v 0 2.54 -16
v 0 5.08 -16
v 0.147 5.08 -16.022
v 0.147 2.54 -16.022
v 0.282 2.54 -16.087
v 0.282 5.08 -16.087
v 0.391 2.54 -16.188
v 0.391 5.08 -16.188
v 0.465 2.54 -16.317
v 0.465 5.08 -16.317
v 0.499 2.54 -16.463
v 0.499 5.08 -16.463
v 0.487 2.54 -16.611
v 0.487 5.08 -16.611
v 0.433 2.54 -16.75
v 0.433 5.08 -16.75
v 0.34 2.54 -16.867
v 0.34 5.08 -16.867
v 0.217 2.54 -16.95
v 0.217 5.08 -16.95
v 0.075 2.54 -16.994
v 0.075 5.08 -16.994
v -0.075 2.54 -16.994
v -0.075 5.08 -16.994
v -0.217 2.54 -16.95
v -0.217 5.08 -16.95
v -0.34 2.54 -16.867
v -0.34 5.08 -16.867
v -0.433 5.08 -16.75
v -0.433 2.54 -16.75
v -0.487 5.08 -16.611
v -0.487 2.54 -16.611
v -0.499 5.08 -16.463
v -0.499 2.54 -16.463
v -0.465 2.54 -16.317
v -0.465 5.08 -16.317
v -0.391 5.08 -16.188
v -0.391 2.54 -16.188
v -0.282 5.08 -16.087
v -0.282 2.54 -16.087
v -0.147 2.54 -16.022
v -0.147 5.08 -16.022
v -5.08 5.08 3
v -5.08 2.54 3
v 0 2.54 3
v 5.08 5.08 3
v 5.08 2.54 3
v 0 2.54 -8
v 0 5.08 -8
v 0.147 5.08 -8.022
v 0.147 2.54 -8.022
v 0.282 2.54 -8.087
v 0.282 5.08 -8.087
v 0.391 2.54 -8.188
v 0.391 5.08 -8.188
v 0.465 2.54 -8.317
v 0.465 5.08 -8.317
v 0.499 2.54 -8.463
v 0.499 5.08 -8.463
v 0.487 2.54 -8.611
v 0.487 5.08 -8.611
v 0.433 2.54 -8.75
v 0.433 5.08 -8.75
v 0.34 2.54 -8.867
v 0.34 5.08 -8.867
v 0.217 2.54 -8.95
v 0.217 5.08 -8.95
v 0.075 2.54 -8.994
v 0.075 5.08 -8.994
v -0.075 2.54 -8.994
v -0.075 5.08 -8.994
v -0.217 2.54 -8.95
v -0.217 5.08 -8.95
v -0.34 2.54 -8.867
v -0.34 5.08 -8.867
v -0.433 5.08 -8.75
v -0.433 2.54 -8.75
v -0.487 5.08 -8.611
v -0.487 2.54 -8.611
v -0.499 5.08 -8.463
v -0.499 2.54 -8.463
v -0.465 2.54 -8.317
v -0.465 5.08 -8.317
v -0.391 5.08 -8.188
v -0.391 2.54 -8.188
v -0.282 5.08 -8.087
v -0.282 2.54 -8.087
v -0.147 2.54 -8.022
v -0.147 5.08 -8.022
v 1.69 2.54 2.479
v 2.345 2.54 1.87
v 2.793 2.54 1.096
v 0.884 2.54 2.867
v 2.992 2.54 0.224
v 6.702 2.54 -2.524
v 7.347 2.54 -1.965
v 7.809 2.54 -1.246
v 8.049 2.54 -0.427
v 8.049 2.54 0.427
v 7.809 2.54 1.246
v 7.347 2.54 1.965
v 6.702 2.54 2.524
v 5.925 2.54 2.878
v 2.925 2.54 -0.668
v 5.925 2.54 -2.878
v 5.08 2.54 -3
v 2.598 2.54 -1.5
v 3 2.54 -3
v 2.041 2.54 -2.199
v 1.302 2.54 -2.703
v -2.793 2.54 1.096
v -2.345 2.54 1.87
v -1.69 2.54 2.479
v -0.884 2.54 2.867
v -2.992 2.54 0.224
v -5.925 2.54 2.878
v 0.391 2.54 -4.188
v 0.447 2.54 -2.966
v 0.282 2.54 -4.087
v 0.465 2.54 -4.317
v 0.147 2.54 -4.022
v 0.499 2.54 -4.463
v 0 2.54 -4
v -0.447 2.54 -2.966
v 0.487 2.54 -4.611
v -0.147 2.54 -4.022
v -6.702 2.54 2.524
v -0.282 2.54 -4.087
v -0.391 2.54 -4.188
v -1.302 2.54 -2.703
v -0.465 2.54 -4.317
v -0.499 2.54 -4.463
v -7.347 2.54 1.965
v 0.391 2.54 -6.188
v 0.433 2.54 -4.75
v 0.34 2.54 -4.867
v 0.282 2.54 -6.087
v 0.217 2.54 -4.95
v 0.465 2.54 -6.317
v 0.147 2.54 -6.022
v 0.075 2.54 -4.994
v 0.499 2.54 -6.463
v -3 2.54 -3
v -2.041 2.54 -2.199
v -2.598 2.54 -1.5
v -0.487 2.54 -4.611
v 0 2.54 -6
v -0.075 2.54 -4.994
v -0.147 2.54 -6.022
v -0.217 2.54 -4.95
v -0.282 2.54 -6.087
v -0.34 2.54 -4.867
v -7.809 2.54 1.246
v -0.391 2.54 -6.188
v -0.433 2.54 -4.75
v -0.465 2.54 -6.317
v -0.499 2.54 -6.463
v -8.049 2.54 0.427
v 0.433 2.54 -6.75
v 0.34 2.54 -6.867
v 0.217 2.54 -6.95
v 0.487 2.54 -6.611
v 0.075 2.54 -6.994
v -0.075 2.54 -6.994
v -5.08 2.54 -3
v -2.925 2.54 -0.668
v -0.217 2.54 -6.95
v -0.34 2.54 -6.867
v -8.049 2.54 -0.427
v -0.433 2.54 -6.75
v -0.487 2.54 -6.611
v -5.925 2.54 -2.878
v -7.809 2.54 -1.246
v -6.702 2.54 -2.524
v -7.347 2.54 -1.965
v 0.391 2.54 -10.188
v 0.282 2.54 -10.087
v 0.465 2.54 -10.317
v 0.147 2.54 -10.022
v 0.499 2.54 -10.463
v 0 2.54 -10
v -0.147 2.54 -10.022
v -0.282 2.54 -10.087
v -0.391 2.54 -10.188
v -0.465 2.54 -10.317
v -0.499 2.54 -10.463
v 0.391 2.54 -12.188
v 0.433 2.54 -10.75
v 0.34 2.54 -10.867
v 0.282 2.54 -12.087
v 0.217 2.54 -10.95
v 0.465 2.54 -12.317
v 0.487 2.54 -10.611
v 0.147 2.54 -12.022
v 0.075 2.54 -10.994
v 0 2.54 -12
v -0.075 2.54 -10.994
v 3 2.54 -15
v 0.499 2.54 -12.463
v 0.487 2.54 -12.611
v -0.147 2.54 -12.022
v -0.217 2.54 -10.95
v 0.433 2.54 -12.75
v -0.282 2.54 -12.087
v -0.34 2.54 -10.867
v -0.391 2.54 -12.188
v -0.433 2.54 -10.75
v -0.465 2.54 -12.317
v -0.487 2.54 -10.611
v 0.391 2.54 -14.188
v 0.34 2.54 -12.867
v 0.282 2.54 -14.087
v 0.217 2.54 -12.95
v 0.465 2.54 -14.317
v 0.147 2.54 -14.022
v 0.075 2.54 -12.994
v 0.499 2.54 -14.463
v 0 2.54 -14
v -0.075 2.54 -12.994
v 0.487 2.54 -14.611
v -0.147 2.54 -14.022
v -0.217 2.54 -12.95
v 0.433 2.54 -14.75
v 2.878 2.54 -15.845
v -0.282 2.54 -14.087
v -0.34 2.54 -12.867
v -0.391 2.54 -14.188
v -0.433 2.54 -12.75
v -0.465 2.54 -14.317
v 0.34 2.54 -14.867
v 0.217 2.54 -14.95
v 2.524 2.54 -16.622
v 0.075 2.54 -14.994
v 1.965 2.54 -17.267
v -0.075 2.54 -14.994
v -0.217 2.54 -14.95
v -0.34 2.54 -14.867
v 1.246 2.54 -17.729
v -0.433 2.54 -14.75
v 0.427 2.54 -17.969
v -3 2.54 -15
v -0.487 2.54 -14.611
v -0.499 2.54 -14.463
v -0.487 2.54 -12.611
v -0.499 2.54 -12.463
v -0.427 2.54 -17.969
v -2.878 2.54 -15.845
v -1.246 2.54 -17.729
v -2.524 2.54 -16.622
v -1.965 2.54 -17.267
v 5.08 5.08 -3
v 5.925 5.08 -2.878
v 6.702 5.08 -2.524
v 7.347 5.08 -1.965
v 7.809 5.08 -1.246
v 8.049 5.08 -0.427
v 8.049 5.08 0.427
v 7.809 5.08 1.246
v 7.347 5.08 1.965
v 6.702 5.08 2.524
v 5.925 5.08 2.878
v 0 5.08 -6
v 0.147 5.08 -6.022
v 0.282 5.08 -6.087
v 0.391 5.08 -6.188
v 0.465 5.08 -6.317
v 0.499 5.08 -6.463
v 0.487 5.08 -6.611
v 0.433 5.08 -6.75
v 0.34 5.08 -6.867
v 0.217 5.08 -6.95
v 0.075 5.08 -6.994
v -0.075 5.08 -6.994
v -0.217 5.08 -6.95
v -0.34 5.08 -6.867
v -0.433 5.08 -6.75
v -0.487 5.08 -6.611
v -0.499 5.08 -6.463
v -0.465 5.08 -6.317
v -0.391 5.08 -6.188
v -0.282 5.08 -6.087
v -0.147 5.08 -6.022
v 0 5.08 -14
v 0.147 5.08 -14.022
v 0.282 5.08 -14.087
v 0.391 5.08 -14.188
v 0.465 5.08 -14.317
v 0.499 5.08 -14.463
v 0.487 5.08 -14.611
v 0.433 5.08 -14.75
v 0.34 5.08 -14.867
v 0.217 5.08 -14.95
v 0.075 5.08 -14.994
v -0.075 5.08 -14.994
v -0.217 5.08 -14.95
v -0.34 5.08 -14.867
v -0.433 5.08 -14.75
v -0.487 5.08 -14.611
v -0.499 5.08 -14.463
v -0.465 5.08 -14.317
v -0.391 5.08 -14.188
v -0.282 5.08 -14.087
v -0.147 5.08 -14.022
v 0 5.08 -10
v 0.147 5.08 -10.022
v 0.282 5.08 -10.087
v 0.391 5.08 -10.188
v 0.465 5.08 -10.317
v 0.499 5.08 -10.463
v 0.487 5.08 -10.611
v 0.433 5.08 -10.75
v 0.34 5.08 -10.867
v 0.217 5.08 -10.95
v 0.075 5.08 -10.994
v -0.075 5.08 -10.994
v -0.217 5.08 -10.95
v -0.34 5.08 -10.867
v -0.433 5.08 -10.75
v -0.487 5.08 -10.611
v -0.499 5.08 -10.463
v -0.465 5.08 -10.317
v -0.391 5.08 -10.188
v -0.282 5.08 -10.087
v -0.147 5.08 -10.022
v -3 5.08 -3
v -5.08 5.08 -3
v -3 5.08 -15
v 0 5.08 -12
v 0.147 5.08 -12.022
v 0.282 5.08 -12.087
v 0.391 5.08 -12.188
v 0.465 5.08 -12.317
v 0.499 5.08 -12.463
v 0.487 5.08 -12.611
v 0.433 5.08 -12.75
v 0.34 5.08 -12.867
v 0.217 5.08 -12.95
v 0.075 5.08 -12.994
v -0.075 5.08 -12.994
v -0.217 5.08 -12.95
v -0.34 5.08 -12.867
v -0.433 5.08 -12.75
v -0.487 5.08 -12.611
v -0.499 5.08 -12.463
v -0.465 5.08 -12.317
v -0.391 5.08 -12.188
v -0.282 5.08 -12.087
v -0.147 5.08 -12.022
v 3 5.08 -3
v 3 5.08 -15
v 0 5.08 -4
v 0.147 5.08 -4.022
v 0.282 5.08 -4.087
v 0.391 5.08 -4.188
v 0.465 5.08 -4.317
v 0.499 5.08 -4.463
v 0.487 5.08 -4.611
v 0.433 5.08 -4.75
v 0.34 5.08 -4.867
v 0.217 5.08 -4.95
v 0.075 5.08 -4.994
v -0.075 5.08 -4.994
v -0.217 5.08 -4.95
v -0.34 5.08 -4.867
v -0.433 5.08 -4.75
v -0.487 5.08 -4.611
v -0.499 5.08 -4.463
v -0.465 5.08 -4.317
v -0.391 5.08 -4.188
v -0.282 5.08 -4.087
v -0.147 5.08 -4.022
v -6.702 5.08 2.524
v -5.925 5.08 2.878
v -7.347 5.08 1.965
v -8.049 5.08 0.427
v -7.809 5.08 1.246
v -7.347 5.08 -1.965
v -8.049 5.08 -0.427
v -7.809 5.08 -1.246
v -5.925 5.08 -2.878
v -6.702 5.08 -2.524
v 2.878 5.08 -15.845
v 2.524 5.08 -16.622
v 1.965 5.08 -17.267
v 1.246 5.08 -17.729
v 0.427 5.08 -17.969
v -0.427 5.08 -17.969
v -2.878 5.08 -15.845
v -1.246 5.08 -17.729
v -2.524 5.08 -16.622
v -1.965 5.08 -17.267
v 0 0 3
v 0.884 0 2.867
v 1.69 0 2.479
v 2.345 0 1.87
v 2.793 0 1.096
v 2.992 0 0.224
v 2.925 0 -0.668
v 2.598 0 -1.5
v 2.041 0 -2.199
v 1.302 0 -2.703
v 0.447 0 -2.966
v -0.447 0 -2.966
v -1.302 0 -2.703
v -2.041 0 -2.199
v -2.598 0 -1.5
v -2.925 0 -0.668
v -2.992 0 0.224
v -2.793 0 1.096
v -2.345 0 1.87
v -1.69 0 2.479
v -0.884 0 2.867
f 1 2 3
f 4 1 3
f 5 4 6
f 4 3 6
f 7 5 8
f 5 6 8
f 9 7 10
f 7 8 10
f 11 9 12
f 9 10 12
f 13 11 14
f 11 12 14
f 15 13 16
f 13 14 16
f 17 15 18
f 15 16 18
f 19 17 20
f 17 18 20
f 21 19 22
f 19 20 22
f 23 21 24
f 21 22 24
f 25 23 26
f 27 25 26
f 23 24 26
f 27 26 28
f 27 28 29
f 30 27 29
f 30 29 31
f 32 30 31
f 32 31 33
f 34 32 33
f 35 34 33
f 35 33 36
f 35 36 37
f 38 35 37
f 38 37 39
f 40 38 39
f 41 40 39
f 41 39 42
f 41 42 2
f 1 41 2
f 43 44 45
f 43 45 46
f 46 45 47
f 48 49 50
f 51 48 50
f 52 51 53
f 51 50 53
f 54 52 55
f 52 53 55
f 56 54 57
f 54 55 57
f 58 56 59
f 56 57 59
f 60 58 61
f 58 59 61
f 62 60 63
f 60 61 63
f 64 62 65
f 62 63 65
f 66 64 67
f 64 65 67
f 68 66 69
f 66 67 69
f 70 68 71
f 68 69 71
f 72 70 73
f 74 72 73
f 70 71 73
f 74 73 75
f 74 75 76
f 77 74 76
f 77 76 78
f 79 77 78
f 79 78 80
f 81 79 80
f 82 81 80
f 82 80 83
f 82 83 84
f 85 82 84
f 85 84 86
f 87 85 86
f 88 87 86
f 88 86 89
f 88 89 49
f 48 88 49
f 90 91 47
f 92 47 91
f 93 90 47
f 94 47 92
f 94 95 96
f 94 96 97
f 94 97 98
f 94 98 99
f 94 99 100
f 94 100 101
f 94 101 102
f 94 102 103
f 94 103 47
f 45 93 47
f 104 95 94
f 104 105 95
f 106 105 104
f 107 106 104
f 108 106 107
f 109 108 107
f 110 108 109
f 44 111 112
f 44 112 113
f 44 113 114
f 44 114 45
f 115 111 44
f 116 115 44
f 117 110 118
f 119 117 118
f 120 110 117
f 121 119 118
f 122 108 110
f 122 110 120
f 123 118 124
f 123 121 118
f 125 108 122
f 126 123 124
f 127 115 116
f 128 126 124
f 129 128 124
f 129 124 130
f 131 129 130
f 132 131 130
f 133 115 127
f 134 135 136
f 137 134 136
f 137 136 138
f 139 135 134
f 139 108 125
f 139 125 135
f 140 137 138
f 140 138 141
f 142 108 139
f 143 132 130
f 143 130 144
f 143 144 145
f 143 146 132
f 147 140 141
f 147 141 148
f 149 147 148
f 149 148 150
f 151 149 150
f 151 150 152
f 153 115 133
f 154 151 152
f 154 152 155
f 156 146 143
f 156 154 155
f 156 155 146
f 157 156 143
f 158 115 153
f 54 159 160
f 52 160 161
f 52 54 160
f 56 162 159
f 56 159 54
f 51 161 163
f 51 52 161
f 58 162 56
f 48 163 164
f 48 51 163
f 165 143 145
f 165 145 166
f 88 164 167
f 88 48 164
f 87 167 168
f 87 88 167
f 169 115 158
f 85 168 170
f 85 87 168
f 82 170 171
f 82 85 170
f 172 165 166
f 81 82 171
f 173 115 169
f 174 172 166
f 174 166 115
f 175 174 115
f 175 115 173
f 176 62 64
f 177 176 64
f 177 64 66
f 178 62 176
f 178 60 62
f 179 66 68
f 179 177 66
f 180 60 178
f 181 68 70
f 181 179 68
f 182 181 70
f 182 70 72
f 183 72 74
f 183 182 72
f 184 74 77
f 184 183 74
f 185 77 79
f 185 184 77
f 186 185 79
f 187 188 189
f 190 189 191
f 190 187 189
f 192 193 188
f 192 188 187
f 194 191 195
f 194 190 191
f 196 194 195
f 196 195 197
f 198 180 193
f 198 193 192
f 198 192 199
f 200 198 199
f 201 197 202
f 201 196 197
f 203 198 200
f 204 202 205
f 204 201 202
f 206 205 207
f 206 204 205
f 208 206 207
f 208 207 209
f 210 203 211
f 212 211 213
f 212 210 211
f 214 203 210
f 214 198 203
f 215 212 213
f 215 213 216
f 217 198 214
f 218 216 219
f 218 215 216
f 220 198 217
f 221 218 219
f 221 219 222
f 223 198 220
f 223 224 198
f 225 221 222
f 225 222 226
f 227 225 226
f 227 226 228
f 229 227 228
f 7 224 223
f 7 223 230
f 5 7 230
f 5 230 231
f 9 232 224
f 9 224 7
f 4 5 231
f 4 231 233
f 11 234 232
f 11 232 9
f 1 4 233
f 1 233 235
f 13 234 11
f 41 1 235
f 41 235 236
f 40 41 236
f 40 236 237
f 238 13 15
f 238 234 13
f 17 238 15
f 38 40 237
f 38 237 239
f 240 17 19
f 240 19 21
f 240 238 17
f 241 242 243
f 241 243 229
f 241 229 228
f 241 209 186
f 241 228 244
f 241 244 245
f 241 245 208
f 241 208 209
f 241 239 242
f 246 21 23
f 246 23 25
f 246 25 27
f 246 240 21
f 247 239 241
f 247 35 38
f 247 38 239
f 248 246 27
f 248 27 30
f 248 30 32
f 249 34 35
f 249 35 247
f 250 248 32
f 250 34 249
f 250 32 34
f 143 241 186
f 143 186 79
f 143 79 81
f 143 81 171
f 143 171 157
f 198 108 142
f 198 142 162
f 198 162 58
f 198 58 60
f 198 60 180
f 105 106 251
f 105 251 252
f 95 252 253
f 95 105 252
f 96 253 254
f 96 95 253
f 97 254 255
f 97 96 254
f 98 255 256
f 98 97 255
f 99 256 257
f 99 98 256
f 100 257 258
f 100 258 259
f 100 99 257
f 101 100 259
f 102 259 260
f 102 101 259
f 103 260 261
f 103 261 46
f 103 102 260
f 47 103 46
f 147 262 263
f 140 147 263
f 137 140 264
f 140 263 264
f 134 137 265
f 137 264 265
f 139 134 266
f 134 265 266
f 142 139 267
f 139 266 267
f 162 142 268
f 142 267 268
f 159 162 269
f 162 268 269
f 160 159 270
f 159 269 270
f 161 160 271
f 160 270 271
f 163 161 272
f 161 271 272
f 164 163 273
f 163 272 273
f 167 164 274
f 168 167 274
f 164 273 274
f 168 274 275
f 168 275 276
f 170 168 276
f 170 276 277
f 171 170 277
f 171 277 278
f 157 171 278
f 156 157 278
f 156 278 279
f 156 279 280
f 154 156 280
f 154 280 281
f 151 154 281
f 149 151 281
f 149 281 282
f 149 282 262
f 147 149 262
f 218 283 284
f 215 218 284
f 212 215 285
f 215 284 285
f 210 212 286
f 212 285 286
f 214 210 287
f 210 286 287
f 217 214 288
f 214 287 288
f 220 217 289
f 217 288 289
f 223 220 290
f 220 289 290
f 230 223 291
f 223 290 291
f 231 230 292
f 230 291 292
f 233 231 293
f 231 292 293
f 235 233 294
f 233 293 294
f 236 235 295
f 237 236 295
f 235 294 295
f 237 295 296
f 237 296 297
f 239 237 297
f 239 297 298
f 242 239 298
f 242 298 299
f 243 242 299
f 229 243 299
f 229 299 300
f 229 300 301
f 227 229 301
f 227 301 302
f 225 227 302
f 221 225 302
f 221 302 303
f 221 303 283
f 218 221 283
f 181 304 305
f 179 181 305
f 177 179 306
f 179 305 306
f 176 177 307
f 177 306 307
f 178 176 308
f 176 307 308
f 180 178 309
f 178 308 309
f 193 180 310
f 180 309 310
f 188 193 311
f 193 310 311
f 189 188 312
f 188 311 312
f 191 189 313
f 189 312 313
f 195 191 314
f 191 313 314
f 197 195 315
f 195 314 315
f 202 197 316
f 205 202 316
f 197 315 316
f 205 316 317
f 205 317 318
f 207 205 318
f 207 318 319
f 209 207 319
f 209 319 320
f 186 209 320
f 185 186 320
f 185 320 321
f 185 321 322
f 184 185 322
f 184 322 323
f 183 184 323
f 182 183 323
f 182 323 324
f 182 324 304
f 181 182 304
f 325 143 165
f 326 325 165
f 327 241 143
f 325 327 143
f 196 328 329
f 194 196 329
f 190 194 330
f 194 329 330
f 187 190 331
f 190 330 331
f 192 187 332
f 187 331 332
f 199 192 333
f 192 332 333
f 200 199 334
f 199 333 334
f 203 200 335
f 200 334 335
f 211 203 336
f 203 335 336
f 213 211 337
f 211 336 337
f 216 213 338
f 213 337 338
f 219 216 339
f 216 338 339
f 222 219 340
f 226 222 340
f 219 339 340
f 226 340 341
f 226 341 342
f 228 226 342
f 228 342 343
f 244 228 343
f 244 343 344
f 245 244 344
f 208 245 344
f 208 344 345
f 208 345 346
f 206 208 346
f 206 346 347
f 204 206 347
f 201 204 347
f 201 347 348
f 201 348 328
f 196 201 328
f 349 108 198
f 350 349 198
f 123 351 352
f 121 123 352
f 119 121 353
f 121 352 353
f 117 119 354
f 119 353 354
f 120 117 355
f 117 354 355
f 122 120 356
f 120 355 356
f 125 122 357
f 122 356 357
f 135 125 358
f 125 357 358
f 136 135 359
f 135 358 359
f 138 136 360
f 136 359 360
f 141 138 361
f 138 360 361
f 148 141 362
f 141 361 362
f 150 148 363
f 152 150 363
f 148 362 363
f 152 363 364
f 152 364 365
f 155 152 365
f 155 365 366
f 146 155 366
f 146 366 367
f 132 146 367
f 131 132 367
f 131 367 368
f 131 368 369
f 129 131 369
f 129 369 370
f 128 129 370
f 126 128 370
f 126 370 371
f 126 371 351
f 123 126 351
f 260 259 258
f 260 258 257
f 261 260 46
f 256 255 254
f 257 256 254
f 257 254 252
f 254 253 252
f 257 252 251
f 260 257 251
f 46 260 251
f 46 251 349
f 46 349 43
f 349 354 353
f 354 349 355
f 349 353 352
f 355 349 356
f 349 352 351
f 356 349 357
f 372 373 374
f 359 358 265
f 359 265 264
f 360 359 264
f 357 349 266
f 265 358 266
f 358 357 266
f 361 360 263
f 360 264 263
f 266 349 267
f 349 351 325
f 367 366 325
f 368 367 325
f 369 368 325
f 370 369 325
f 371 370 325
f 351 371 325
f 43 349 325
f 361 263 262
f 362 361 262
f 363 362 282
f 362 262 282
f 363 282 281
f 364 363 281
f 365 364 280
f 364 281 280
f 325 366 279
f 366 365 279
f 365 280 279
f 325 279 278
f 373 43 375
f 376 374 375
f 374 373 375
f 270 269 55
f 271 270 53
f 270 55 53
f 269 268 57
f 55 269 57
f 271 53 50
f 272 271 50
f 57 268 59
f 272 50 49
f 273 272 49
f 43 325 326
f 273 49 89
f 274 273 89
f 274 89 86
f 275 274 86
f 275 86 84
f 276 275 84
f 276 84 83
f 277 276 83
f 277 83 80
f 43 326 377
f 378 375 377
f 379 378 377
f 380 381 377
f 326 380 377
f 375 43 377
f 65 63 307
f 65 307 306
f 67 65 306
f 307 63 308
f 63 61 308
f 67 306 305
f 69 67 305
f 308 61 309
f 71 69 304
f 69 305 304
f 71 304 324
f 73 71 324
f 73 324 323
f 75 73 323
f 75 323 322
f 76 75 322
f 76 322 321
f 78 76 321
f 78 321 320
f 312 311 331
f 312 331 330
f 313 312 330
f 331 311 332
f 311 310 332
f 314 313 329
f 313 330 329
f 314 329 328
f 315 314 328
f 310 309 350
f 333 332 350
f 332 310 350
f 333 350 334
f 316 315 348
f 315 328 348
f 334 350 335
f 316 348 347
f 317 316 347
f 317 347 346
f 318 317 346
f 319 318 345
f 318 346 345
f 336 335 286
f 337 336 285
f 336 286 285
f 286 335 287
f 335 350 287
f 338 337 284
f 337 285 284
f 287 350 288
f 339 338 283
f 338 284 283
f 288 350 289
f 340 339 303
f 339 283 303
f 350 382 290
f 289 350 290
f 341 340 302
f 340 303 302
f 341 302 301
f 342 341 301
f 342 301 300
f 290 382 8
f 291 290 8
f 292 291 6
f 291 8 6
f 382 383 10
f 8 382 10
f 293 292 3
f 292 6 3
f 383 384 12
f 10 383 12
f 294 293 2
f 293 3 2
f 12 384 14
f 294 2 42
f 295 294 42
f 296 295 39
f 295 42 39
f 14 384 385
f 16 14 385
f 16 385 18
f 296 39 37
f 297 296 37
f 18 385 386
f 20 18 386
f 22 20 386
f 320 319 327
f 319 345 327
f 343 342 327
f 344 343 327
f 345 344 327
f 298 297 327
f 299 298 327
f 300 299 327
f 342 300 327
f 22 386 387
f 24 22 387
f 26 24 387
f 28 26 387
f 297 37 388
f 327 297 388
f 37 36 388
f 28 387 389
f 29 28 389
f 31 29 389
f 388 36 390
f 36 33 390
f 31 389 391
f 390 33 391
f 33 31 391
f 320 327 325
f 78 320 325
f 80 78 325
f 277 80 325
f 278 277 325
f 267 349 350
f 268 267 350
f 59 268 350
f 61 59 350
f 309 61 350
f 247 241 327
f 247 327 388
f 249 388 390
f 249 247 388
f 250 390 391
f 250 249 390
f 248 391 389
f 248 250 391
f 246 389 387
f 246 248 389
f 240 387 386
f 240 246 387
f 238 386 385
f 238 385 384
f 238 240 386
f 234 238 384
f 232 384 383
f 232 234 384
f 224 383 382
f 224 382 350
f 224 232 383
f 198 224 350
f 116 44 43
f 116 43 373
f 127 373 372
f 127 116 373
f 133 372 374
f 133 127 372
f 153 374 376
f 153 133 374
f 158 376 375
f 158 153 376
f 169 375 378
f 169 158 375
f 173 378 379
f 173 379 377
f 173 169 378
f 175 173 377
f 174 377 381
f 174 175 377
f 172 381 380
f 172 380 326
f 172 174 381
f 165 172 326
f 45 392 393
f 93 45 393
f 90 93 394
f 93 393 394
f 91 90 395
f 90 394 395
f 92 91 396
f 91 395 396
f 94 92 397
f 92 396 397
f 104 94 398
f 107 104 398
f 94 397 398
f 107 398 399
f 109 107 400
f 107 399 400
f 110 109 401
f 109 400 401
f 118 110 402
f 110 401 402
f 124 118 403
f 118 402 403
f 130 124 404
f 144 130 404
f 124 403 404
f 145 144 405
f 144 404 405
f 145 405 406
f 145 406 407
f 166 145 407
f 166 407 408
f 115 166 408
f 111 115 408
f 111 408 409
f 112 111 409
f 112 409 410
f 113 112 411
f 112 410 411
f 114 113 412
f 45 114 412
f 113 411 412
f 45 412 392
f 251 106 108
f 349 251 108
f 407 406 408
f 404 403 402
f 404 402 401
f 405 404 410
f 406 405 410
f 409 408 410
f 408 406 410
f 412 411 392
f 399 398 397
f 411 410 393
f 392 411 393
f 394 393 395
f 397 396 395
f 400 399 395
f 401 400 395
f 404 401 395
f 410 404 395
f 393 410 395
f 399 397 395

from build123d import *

# Parameters (mm, degrees)
SKETCH1_R           = 3
BOSS_EXTRUDE1_DEPTH = 2.54
SKETCH2_R           = 3
BOSS_EXTRUDE2_DEPTH = 2.54
SKETCH3_R           = 0.5
CUT_EXTRUDE1_DEPTH  = 10


with BuildPart() as part:
    # Sketch1 → Boss-Extrude1 (new body)
    with BuildSketch(Plane(origin=(0, 0, 0), x_dir=(1, 0, 0), z_dir=(0, 1, 0))):
        with Locations(Location((0, 0, 0), (0, 0, 270))):
            Circle(SKETCH1_R)
    extrude(amount=BOSS_EXTRUDE1_DEPTH)

    # Sketch2 → Boss-Extrude2 (add)
    with BuildSketch(Plane(origin=(0, 2.54, 0), x_dir=(1, 0, 0), z_dir=(0, 1, 0))):
        with BuildLine():
            ThreePointArc((-3, 15), (0, 18), (3, 15))
            Line((3, 15), (-3, 15))
        make_face()
        Polygon((-3, 15), (-3, 3), (0, 3), (3, 3), (3, 15), align=None)
        with BuildLine():
            Line((-5.08, 3), (-5.08, -3))
            ThreePointArc((-5.08, -3), (-8.08, 0), (-5.08, 3))
        make_face()
        Polygon((-3, 3), (-5.08, 3), (-5.08, -3), (-3, -3), (-3, 6e-09), align=None)
        with BuildLine():
            Line((3, 3), (0, 3))
            ThreePointArc((0, 3), (2.121320344, 2.121320344), (3, 0))
            Line((3, 0), (3, 3))
        make_face()
        with Locations(Location((0, 0, 0), (0, 0, 270))):
            Circle(SKETCH2_R)
        with BuildLine():
            Line((3, -3), (3, 0))
            ThreePointArc((3, 0), (2.121320338, -2.121320349), (-1.5e-08, -3))
            Line((-1.5e-08, -3), (3, -3))
        make_face()
        with BuildLine():
            ThreePointArc((5.08, 3), (8.08, 0), (5.08, -3))
            Line((5.08, -3), (5.08, 3))
        make_face()
        Polygon((5.08, 3), (3, 3), (3, 0), (3, -3), (5.08, -3), align=None)
        with BuildLine():
            ThreePointArc((-1.5e-08, -3), (-2.121320351, -2.121320336), (-3, 6e-09))
            Line((-3, 6e-09), (-3, -3))
            Line((-3, -3), (-1.5e-08, -3))
        make_face()
        with BuildLine():
            Line((0, 3), (-3, 3))
            Line((-3, 3), (-3, 6e-09))
            ThreePointArc((-3, 6e-09), (-2.121320342, 2.121320346), (0, 3))
        make_face()
    extrude(amount=BOSS_EXTRUDE2_DEPTH)

    # Sketch3 → Cut-Extrude1 (cut)
    with BuildSketch(Plane(origin=(0, 5.08, 0), x_dir=(1, 0, 0), z_dir=(0, 1, 0))):
        with Locations(Location((0, 16.5, 0), (0, 0, 270))):
            Circle(SKETCH3_R)
        with Locations(Location((0, 14.5, 0), (0, 0, 270))):
            Circle(SKETCH3_R)
        with Locations(Location((0, 12.5, 0), (0, 0, 270))):
            Circle(SKETCH3_R)
        with Locations(Location((0, 10.5, 0), (0, 0, 270))):
            Circle(SKETCH3_R)
        with Locations(Location((0, 8.5, 0), (0, 0, 270))):
            Circle(SKETCH3_R)
        with Locations(Location((0, 6.5, 0), (0, 0, 270))):
            Circle(SKETCH3_R)
        with Locations(Location((0, 4.5, 0), (0, 0, 270))):
            Circle(SKETCH3_R)
    extrude(amount=-CUT_EXTRUDE1_DEPTH, mode=Mode.SUBTRACT)


solid = part.part
